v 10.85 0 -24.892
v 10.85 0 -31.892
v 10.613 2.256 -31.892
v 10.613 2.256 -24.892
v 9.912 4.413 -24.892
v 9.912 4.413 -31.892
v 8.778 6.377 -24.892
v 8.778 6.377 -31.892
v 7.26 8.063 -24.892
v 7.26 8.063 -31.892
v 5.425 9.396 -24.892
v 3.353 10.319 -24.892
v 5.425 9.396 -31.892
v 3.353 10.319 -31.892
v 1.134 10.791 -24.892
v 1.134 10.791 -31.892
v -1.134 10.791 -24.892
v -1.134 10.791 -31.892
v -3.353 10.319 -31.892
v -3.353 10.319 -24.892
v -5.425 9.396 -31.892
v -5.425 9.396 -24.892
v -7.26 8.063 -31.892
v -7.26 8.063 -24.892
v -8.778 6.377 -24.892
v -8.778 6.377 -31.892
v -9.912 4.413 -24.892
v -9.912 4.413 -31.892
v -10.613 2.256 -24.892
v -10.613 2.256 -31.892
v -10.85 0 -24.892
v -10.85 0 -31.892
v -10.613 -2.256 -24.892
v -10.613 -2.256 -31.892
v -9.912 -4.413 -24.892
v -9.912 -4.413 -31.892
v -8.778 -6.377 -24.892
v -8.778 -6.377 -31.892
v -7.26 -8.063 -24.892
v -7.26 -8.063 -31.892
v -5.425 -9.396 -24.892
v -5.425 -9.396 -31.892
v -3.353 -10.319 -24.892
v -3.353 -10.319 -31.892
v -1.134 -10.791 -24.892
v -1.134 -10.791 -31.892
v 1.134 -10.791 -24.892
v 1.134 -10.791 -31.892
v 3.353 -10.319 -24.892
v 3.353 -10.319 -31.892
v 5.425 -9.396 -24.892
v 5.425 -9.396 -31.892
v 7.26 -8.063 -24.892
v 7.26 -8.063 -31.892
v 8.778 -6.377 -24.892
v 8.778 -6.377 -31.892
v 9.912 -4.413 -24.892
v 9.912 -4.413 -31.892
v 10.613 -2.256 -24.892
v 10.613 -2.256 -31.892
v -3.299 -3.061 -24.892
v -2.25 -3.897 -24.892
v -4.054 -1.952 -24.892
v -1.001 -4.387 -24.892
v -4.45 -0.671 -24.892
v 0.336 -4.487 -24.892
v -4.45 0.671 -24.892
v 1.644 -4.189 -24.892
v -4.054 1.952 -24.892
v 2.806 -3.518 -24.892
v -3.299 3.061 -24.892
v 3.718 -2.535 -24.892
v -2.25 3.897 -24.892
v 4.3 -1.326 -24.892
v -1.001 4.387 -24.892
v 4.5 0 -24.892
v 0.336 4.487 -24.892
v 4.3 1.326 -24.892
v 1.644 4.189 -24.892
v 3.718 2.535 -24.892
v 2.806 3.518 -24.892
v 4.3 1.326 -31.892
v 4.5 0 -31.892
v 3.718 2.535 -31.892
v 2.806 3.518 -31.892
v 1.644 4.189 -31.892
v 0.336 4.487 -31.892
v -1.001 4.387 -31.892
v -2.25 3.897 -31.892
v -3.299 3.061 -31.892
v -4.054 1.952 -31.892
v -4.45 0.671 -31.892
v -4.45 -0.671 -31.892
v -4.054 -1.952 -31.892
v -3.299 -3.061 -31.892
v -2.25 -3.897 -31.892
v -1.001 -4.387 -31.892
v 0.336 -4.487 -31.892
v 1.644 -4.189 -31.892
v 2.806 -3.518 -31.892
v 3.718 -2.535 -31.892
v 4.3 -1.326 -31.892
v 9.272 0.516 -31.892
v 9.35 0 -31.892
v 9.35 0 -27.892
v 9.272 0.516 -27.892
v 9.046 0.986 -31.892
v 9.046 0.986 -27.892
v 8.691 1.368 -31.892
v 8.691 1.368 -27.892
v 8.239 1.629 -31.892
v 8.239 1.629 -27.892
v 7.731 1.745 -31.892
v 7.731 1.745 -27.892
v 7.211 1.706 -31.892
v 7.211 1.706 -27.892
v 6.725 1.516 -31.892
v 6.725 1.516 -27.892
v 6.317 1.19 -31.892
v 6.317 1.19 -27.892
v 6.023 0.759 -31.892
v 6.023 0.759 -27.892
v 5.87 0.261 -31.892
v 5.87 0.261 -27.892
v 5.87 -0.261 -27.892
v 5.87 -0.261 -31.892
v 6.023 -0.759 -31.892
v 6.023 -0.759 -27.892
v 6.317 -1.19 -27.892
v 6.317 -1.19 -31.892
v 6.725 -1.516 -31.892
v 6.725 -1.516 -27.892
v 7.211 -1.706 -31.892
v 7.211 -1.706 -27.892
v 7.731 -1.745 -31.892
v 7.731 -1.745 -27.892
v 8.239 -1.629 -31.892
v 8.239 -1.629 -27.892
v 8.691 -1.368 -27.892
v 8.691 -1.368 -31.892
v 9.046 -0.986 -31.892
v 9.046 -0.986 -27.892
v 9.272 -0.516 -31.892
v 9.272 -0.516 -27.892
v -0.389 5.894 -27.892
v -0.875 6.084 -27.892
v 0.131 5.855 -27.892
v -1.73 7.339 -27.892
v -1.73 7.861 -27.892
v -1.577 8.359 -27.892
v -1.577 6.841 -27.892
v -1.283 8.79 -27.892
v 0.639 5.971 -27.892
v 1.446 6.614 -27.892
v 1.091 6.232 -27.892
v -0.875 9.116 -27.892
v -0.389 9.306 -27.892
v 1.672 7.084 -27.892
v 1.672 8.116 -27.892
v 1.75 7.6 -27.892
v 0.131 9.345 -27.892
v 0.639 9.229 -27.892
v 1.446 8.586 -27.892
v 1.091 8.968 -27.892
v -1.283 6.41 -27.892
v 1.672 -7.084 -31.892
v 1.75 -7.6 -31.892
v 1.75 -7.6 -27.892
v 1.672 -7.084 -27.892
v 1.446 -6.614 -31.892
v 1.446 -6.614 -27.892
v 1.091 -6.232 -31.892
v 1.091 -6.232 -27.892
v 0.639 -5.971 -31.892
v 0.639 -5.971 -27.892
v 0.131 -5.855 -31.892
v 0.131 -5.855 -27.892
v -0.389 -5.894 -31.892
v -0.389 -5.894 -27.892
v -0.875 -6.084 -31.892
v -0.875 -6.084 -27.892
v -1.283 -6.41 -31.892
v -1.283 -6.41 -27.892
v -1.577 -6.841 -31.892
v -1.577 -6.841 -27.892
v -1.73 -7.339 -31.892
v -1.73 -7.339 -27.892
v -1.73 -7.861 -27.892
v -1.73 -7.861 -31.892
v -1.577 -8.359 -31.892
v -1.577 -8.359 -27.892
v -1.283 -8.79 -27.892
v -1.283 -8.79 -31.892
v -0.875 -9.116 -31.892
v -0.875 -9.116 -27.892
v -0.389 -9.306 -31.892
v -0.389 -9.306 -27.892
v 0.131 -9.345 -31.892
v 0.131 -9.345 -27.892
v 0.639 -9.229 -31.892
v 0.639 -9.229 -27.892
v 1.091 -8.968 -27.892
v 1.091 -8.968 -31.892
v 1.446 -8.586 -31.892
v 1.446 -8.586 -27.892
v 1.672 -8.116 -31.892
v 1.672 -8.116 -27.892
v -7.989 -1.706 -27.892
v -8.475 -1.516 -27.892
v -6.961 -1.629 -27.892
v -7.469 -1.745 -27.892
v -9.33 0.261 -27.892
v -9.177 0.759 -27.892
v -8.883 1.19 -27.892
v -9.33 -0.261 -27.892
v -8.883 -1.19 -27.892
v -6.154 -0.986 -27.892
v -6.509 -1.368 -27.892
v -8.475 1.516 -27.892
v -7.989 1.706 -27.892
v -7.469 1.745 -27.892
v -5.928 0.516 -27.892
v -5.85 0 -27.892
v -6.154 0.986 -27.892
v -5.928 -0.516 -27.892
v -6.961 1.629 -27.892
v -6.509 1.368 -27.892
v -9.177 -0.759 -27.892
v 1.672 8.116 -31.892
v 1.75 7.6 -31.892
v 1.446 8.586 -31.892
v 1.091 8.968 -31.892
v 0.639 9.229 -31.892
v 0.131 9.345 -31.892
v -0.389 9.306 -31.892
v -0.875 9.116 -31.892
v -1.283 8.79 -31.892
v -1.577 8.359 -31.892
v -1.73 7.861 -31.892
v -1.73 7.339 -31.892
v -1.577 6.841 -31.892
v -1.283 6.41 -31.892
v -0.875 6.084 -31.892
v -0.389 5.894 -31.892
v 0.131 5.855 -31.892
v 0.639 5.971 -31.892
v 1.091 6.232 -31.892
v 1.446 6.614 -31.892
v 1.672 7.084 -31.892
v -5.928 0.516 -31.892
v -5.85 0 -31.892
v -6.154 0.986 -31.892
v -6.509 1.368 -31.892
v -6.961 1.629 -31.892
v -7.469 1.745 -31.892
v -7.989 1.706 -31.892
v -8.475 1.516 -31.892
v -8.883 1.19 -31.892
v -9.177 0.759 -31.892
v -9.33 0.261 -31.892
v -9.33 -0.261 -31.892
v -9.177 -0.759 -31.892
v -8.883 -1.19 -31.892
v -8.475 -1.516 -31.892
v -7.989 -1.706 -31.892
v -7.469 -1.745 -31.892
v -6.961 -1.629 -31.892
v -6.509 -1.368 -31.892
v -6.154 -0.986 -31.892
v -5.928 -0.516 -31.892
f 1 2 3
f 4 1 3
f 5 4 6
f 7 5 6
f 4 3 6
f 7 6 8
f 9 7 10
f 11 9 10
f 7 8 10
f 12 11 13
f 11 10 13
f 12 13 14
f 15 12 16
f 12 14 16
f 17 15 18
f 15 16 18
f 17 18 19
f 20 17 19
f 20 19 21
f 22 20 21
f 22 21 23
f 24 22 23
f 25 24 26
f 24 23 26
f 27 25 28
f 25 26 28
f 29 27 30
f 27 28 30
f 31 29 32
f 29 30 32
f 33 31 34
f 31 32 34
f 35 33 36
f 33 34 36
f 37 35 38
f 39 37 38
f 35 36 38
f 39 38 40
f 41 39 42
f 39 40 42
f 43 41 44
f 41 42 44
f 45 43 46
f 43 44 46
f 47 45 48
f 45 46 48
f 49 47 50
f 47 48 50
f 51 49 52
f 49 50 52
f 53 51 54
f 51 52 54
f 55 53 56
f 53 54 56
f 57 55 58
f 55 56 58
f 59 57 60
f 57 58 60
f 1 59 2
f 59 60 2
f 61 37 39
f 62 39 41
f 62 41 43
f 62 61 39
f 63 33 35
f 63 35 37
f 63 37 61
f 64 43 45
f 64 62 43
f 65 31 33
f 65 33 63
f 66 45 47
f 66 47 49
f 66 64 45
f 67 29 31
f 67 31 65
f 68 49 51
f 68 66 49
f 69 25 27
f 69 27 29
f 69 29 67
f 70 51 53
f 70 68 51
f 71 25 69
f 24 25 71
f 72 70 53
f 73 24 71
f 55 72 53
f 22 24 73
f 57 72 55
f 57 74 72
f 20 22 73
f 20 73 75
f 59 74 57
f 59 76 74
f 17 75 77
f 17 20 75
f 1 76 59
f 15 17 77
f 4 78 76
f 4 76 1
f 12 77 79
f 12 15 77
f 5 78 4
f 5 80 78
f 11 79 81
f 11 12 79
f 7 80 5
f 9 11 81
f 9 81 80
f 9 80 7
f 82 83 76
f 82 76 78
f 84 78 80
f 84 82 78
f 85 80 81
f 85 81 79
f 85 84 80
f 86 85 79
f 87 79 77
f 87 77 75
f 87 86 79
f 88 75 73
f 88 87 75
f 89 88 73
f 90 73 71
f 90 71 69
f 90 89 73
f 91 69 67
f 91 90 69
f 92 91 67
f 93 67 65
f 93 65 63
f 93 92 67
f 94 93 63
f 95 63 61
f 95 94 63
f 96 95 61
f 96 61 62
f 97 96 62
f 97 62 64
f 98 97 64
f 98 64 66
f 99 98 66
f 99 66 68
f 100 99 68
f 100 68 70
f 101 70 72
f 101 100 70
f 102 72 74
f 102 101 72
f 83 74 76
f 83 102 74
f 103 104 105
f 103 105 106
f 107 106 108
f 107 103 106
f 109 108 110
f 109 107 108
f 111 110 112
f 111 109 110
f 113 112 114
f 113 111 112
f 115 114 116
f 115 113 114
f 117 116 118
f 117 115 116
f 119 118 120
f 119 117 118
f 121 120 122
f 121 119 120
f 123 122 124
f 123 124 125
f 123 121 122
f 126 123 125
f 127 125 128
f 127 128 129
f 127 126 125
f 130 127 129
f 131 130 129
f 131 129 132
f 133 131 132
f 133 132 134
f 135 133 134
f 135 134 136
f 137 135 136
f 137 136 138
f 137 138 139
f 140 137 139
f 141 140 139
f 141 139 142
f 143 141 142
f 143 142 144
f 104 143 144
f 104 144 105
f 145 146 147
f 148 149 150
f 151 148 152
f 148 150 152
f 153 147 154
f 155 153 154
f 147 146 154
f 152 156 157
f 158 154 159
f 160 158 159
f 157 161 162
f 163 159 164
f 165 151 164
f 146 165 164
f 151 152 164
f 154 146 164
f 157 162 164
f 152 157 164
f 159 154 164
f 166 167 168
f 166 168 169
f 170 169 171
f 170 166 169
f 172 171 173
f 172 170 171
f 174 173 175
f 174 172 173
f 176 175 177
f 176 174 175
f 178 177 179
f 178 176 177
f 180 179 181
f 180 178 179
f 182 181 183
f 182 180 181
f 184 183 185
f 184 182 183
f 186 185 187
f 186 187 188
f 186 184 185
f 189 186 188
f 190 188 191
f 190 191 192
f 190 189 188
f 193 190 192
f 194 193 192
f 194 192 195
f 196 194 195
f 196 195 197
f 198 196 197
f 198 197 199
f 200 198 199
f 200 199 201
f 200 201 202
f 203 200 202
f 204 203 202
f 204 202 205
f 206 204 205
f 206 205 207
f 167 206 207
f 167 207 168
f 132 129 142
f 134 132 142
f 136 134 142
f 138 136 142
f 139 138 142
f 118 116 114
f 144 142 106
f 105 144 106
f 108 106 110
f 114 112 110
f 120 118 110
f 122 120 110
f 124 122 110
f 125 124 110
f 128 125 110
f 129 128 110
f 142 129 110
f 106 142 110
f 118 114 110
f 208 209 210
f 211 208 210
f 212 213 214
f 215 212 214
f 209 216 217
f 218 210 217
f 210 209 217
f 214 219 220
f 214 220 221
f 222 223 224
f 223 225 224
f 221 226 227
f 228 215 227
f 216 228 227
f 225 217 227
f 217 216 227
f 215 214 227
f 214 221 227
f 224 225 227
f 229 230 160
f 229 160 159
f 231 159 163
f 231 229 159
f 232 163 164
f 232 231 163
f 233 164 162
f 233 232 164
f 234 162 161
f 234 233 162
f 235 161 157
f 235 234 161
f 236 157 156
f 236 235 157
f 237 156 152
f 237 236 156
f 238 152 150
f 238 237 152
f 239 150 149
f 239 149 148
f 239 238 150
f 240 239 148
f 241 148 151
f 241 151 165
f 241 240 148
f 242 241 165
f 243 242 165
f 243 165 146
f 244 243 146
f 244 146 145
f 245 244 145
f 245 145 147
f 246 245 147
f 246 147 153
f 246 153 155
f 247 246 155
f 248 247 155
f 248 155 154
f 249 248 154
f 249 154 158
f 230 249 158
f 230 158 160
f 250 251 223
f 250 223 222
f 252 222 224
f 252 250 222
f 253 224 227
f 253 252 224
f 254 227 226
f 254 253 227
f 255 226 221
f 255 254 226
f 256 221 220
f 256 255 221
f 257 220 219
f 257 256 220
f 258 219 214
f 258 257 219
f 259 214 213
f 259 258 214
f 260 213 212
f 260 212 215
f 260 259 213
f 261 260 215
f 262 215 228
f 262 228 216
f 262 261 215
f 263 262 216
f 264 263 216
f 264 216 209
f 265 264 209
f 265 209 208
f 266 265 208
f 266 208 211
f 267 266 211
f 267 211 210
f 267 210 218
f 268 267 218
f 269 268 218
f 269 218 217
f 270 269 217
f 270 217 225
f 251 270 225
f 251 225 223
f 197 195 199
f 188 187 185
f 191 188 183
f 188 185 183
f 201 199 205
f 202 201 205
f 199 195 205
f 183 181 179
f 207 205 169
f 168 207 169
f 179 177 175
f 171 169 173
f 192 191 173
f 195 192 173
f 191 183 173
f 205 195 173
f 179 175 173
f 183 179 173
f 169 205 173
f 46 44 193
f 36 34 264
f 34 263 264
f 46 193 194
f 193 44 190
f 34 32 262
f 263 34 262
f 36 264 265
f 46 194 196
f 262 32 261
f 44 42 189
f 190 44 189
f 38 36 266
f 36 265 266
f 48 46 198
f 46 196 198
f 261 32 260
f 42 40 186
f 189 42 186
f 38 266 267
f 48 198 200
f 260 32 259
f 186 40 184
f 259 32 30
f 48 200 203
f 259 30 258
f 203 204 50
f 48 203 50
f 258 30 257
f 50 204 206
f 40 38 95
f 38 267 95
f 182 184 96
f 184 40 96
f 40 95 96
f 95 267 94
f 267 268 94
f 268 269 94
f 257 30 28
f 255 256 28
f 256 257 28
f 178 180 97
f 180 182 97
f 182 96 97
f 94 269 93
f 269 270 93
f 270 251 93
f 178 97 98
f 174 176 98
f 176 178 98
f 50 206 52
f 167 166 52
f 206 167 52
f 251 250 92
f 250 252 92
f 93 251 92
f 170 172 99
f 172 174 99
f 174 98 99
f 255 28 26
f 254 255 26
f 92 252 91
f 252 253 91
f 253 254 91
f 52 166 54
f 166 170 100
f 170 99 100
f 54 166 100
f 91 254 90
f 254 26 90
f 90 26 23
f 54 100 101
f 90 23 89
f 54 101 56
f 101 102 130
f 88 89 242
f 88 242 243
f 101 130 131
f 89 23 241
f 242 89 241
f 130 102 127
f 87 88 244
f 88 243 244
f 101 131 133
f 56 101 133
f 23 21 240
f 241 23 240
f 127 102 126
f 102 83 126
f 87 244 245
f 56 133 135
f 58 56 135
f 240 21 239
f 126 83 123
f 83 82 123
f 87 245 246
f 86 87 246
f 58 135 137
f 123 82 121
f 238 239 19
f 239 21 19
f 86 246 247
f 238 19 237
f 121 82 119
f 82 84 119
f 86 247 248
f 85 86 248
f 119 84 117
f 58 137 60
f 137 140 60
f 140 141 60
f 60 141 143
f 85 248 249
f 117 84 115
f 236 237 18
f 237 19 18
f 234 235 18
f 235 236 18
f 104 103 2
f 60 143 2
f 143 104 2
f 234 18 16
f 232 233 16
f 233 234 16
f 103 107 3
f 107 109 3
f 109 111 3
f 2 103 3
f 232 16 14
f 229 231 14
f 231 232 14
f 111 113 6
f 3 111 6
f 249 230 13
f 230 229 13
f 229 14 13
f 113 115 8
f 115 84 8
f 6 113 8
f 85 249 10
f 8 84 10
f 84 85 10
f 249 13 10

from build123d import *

# Parameters (mm, degrees)
SKETCH2_R           = 10.85
SKETCH2_R_2         = 1.75
SKETCH2_R_3         = 4.5
BOSS_EXTRUDE1_DEPTH = 7
SKETCH3_R           = 1.75
BOSS_EXTRUDE2_DEPTH = 3


with BuildPart() as part:
    # Sketch2 → Boss-Extrude1 (new body)
    with BuildSketch(Plane.XY.offset(-31.892451267)):
        Circle(SKETCH2_R)
        with Locations((-7.6, 0)):
            Circle(SKETCH2_R_2, mode=Mode.SUBTRACT)
        with Locations((7.6, 0)):
            Circle(SKETCH2_R_2, mode=Mode.SUBTRACT)
        Circle(SKETCH2_R_3, mode=Mode.SUBTRACT)
        with Locations((0, 7.6)):
            Circle(SKETCH2_R_2, mode=Mode.SUBTRACT)
        with Locations((0, -7.6)):
            Circle(SKETCH2_R_2, mode=Mode.SUBTRACT)
    extrude(amount=BOSS_EXTRUDE1_DEPTH)

    # Sketch3 → Boss-Extrude2 (add)
    with BuildSketch(Plane.XY.offset(-24.892451267)):
        with Locations((0, 7.6)):
            Circle(SKETCH3_R)
        with Locations((-7.6, 0)):
            Circle(SKETCH3_R)
        with Locations((0, -7.6)):
            Circle(SKETCH3_R)
        with Locations((7.6, 0)):
            Circle(SKETCH3_R)
    extrude(amount=-BOSS_EXTRUDE2_DEPTH)


solid = part.part
